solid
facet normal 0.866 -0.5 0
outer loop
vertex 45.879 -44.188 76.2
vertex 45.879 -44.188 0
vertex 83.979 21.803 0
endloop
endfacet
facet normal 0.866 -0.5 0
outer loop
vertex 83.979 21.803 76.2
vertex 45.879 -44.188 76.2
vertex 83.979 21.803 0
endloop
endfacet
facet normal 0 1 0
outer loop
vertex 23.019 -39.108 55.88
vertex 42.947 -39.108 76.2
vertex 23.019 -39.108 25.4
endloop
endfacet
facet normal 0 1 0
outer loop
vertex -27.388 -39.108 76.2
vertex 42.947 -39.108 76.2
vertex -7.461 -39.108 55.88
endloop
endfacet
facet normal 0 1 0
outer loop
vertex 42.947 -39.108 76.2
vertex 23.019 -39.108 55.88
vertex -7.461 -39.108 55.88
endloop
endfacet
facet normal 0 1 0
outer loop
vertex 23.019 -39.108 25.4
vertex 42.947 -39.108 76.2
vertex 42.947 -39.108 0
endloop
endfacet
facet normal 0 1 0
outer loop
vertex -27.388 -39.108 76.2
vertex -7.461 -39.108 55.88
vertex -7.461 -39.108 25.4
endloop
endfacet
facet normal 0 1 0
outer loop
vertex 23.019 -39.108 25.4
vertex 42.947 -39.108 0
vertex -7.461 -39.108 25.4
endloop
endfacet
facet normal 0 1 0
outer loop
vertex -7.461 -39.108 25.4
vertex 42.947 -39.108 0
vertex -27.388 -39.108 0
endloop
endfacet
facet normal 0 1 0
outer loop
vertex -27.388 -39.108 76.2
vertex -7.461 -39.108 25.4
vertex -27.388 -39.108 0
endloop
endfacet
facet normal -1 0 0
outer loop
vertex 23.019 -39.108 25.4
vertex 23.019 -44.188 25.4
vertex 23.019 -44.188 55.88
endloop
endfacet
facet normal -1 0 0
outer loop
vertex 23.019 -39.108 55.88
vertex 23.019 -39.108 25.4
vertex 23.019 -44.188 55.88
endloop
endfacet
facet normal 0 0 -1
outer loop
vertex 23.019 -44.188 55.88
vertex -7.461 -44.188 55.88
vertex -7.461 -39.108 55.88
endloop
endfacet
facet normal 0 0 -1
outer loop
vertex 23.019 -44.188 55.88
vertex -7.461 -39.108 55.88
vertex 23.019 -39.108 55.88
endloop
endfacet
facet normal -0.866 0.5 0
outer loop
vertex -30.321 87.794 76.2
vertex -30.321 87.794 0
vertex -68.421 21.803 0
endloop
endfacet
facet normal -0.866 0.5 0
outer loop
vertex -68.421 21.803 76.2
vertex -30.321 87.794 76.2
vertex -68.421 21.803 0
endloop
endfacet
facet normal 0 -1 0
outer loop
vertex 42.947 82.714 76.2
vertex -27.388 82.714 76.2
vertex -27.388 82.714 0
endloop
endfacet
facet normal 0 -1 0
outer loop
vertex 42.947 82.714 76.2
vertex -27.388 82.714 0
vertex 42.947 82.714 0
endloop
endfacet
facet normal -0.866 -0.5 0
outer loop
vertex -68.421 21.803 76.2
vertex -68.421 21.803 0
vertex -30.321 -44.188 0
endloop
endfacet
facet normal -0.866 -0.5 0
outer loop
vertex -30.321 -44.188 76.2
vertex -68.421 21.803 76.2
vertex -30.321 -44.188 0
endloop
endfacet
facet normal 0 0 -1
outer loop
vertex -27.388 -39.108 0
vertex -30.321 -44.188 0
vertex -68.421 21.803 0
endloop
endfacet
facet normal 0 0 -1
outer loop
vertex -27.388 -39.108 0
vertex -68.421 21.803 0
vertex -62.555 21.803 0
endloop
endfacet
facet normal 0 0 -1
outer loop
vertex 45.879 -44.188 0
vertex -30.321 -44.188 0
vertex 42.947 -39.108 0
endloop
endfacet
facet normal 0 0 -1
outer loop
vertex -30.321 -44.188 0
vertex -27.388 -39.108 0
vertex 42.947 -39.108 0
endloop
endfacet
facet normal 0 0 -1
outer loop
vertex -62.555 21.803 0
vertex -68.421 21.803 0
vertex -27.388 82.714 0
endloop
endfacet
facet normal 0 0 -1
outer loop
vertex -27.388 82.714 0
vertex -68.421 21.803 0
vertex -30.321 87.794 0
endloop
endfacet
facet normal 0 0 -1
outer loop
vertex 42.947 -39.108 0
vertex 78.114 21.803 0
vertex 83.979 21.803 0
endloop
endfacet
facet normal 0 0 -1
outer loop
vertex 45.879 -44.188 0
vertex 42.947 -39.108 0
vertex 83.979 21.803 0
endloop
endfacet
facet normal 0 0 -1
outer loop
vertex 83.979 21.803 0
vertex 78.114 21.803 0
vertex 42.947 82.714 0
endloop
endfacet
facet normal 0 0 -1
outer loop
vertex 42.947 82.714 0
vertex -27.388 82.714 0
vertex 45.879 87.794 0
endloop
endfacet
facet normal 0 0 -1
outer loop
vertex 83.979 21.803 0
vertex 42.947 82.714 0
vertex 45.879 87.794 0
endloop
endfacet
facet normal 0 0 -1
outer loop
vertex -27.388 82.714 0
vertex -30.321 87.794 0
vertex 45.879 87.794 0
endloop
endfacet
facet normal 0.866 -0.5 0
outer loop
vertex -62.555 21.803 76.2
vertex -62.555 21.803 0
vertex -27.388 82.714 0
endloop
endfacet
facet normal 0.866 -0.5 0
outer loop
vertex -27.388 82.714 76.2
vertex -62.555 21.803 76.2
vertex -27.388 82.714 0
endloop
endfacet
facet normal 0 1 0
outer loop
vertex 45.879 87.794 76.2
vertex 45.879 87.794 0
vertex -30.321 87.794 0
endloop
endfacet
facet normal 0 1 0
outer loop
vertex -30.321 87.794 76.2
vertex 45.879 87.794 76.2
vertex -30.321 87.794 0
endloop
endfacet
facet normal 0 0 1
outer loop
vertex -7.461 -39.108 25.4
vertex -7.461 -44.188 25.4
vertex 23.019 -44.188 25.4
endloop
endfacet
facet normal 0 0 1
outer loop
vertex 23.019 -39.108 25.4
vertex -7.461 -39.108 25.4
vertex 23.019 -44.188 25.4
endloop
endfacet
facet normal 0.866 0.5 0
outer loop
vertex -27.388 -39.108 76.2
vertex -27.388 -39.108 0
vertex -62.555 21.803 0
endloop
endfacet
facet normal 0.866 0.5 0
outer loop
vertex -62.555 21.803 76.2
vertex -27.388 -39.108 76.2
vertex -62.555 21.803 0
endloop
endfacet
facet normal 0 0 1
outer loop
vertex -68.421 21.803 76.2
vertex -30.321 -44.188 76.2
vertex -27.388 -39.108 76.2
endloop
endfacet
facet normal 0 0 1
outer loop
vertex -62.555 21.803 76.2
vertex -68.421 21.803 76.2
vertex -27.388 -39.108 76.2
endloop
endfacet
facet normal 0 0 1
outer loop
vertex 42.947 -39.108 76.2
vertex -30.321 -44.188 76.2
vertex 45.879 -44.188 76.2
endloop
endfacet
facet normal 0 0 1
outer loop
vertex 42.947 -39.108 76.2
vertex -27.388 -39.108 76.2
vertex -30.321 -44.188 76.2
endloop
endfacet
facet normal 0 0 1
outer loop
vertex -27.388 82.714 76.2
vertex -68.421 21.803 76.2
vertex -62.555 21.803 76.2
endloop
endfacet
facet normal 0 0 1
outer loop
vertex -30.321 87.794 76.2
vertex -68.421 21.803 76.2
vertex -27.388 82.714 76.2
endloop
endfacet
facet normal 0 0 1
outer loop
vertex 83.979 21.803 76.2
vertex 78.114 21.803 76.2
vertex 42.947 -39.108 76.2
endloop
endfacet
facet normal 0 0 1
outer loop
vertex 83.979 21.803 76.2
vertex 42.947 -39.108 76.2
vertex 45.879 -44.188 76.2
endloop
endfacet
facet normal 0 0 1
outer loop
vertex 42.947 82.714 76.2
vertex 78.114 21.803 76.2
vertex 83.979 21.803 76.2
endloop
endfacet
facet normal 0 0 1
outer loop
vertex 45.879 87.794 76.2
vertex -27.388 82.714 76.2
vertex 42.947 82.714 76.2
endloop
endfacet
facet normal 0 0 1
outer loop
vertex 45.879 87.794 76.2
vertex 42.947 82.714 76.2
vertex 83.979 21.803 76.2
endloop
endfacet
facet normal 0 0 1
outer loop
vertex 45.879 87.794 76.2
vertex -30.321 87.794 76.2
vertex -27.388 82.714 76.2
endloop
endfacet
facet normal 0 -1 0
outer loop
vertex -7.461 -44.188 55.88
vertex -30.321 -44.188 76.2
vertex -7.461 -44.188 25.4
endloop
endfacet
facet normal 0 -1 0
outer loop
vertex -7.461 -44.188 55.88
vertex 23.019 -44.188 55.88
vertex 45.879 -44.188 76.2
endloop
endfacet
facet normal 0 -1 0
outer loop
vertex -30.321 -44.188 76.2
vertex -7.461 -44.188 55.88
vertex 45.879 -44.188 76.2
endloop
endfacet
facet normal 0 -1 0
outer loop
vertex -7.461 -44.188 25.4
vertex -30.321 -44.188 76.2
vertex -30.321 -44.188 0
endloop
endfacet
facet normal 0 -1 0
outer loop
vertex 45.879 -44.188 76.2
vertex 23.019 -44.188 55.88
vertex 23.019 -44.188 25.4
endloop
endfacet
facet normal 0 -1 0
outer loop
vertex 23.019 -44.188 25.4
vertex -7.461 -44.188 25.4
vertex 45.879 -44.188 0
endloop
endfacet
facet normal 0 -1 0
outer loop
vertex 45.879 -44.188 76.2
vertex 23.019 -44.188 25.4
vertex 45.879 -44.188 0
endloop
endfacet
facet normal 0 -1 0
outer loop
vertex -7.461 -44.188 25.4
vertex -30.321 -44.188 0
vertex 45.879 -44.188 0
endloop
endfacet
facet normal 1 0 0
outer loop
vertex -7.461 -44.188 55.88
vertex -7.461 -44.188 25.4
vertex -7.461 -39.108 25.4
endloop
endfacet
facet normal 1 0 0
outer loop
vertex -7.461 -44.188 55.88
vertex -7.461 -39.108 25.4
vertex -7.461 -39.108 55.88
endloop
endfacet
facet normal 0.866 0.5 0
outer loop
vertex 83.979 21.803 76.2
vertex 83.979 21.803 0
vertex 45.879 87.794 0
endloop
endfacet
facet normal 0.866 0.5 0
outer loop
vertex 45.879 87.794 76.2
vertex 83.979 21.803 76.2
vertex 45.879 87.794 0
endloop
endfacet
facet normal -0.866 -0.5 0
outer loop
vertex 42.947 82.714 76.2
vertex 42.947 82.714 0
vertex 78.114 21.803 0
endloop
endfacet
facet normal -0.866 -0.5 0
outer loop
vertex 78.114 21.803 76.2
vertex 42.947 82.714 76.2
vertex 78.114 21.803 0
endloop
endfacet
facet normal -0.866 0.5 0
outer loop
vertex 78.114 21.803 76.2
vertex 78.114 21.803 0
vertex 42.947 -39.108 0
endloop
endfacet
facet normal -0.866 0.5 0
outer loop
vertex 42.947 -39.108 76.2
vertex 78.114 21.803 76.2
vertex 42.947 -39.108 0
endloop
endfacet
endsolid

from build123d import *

# Parameters (mm, degrees)
F2_DEPTH = 76.2
F3_W     = 30.48
F3_H     = 30.48
F4_DEPTH = 5.08


with BuildPart() as f2:
    # F0 (on Top) → F2 (new body)
    with BuildSketch(Plane.XY):
        Polygon((-30.320511, 87.794254), (-68.420511, 21.803118), (-30.320511, -44.188018), (45.879489, -44.188018), (83.979489, 21.803118), (45.879489, 87.794254), align=None)
        Polygon((-27.387572, -39.108018), (-62.554632, 21.803118), (-27.387572, 82.714254), (42.94655, 82.714254), (78.11361, 21.803118), (42.94655, -39.108018), (-7.85345, -39.108018), align=None, mode=Mode.SUBTRACT)
    extrude(amount=F2_DEPTH)

    # F3 (on face) → F4 (cut)
    with BuildSketch(Plane.XZ.offset(44.188018)):
        with Locations((7.779489, 40.64)):
            Rectangle(F3_W, F3_H)
    extrude(amount=-F4_DEPTH, mode=Mode.SUBTRACT)


solid = f2.part
